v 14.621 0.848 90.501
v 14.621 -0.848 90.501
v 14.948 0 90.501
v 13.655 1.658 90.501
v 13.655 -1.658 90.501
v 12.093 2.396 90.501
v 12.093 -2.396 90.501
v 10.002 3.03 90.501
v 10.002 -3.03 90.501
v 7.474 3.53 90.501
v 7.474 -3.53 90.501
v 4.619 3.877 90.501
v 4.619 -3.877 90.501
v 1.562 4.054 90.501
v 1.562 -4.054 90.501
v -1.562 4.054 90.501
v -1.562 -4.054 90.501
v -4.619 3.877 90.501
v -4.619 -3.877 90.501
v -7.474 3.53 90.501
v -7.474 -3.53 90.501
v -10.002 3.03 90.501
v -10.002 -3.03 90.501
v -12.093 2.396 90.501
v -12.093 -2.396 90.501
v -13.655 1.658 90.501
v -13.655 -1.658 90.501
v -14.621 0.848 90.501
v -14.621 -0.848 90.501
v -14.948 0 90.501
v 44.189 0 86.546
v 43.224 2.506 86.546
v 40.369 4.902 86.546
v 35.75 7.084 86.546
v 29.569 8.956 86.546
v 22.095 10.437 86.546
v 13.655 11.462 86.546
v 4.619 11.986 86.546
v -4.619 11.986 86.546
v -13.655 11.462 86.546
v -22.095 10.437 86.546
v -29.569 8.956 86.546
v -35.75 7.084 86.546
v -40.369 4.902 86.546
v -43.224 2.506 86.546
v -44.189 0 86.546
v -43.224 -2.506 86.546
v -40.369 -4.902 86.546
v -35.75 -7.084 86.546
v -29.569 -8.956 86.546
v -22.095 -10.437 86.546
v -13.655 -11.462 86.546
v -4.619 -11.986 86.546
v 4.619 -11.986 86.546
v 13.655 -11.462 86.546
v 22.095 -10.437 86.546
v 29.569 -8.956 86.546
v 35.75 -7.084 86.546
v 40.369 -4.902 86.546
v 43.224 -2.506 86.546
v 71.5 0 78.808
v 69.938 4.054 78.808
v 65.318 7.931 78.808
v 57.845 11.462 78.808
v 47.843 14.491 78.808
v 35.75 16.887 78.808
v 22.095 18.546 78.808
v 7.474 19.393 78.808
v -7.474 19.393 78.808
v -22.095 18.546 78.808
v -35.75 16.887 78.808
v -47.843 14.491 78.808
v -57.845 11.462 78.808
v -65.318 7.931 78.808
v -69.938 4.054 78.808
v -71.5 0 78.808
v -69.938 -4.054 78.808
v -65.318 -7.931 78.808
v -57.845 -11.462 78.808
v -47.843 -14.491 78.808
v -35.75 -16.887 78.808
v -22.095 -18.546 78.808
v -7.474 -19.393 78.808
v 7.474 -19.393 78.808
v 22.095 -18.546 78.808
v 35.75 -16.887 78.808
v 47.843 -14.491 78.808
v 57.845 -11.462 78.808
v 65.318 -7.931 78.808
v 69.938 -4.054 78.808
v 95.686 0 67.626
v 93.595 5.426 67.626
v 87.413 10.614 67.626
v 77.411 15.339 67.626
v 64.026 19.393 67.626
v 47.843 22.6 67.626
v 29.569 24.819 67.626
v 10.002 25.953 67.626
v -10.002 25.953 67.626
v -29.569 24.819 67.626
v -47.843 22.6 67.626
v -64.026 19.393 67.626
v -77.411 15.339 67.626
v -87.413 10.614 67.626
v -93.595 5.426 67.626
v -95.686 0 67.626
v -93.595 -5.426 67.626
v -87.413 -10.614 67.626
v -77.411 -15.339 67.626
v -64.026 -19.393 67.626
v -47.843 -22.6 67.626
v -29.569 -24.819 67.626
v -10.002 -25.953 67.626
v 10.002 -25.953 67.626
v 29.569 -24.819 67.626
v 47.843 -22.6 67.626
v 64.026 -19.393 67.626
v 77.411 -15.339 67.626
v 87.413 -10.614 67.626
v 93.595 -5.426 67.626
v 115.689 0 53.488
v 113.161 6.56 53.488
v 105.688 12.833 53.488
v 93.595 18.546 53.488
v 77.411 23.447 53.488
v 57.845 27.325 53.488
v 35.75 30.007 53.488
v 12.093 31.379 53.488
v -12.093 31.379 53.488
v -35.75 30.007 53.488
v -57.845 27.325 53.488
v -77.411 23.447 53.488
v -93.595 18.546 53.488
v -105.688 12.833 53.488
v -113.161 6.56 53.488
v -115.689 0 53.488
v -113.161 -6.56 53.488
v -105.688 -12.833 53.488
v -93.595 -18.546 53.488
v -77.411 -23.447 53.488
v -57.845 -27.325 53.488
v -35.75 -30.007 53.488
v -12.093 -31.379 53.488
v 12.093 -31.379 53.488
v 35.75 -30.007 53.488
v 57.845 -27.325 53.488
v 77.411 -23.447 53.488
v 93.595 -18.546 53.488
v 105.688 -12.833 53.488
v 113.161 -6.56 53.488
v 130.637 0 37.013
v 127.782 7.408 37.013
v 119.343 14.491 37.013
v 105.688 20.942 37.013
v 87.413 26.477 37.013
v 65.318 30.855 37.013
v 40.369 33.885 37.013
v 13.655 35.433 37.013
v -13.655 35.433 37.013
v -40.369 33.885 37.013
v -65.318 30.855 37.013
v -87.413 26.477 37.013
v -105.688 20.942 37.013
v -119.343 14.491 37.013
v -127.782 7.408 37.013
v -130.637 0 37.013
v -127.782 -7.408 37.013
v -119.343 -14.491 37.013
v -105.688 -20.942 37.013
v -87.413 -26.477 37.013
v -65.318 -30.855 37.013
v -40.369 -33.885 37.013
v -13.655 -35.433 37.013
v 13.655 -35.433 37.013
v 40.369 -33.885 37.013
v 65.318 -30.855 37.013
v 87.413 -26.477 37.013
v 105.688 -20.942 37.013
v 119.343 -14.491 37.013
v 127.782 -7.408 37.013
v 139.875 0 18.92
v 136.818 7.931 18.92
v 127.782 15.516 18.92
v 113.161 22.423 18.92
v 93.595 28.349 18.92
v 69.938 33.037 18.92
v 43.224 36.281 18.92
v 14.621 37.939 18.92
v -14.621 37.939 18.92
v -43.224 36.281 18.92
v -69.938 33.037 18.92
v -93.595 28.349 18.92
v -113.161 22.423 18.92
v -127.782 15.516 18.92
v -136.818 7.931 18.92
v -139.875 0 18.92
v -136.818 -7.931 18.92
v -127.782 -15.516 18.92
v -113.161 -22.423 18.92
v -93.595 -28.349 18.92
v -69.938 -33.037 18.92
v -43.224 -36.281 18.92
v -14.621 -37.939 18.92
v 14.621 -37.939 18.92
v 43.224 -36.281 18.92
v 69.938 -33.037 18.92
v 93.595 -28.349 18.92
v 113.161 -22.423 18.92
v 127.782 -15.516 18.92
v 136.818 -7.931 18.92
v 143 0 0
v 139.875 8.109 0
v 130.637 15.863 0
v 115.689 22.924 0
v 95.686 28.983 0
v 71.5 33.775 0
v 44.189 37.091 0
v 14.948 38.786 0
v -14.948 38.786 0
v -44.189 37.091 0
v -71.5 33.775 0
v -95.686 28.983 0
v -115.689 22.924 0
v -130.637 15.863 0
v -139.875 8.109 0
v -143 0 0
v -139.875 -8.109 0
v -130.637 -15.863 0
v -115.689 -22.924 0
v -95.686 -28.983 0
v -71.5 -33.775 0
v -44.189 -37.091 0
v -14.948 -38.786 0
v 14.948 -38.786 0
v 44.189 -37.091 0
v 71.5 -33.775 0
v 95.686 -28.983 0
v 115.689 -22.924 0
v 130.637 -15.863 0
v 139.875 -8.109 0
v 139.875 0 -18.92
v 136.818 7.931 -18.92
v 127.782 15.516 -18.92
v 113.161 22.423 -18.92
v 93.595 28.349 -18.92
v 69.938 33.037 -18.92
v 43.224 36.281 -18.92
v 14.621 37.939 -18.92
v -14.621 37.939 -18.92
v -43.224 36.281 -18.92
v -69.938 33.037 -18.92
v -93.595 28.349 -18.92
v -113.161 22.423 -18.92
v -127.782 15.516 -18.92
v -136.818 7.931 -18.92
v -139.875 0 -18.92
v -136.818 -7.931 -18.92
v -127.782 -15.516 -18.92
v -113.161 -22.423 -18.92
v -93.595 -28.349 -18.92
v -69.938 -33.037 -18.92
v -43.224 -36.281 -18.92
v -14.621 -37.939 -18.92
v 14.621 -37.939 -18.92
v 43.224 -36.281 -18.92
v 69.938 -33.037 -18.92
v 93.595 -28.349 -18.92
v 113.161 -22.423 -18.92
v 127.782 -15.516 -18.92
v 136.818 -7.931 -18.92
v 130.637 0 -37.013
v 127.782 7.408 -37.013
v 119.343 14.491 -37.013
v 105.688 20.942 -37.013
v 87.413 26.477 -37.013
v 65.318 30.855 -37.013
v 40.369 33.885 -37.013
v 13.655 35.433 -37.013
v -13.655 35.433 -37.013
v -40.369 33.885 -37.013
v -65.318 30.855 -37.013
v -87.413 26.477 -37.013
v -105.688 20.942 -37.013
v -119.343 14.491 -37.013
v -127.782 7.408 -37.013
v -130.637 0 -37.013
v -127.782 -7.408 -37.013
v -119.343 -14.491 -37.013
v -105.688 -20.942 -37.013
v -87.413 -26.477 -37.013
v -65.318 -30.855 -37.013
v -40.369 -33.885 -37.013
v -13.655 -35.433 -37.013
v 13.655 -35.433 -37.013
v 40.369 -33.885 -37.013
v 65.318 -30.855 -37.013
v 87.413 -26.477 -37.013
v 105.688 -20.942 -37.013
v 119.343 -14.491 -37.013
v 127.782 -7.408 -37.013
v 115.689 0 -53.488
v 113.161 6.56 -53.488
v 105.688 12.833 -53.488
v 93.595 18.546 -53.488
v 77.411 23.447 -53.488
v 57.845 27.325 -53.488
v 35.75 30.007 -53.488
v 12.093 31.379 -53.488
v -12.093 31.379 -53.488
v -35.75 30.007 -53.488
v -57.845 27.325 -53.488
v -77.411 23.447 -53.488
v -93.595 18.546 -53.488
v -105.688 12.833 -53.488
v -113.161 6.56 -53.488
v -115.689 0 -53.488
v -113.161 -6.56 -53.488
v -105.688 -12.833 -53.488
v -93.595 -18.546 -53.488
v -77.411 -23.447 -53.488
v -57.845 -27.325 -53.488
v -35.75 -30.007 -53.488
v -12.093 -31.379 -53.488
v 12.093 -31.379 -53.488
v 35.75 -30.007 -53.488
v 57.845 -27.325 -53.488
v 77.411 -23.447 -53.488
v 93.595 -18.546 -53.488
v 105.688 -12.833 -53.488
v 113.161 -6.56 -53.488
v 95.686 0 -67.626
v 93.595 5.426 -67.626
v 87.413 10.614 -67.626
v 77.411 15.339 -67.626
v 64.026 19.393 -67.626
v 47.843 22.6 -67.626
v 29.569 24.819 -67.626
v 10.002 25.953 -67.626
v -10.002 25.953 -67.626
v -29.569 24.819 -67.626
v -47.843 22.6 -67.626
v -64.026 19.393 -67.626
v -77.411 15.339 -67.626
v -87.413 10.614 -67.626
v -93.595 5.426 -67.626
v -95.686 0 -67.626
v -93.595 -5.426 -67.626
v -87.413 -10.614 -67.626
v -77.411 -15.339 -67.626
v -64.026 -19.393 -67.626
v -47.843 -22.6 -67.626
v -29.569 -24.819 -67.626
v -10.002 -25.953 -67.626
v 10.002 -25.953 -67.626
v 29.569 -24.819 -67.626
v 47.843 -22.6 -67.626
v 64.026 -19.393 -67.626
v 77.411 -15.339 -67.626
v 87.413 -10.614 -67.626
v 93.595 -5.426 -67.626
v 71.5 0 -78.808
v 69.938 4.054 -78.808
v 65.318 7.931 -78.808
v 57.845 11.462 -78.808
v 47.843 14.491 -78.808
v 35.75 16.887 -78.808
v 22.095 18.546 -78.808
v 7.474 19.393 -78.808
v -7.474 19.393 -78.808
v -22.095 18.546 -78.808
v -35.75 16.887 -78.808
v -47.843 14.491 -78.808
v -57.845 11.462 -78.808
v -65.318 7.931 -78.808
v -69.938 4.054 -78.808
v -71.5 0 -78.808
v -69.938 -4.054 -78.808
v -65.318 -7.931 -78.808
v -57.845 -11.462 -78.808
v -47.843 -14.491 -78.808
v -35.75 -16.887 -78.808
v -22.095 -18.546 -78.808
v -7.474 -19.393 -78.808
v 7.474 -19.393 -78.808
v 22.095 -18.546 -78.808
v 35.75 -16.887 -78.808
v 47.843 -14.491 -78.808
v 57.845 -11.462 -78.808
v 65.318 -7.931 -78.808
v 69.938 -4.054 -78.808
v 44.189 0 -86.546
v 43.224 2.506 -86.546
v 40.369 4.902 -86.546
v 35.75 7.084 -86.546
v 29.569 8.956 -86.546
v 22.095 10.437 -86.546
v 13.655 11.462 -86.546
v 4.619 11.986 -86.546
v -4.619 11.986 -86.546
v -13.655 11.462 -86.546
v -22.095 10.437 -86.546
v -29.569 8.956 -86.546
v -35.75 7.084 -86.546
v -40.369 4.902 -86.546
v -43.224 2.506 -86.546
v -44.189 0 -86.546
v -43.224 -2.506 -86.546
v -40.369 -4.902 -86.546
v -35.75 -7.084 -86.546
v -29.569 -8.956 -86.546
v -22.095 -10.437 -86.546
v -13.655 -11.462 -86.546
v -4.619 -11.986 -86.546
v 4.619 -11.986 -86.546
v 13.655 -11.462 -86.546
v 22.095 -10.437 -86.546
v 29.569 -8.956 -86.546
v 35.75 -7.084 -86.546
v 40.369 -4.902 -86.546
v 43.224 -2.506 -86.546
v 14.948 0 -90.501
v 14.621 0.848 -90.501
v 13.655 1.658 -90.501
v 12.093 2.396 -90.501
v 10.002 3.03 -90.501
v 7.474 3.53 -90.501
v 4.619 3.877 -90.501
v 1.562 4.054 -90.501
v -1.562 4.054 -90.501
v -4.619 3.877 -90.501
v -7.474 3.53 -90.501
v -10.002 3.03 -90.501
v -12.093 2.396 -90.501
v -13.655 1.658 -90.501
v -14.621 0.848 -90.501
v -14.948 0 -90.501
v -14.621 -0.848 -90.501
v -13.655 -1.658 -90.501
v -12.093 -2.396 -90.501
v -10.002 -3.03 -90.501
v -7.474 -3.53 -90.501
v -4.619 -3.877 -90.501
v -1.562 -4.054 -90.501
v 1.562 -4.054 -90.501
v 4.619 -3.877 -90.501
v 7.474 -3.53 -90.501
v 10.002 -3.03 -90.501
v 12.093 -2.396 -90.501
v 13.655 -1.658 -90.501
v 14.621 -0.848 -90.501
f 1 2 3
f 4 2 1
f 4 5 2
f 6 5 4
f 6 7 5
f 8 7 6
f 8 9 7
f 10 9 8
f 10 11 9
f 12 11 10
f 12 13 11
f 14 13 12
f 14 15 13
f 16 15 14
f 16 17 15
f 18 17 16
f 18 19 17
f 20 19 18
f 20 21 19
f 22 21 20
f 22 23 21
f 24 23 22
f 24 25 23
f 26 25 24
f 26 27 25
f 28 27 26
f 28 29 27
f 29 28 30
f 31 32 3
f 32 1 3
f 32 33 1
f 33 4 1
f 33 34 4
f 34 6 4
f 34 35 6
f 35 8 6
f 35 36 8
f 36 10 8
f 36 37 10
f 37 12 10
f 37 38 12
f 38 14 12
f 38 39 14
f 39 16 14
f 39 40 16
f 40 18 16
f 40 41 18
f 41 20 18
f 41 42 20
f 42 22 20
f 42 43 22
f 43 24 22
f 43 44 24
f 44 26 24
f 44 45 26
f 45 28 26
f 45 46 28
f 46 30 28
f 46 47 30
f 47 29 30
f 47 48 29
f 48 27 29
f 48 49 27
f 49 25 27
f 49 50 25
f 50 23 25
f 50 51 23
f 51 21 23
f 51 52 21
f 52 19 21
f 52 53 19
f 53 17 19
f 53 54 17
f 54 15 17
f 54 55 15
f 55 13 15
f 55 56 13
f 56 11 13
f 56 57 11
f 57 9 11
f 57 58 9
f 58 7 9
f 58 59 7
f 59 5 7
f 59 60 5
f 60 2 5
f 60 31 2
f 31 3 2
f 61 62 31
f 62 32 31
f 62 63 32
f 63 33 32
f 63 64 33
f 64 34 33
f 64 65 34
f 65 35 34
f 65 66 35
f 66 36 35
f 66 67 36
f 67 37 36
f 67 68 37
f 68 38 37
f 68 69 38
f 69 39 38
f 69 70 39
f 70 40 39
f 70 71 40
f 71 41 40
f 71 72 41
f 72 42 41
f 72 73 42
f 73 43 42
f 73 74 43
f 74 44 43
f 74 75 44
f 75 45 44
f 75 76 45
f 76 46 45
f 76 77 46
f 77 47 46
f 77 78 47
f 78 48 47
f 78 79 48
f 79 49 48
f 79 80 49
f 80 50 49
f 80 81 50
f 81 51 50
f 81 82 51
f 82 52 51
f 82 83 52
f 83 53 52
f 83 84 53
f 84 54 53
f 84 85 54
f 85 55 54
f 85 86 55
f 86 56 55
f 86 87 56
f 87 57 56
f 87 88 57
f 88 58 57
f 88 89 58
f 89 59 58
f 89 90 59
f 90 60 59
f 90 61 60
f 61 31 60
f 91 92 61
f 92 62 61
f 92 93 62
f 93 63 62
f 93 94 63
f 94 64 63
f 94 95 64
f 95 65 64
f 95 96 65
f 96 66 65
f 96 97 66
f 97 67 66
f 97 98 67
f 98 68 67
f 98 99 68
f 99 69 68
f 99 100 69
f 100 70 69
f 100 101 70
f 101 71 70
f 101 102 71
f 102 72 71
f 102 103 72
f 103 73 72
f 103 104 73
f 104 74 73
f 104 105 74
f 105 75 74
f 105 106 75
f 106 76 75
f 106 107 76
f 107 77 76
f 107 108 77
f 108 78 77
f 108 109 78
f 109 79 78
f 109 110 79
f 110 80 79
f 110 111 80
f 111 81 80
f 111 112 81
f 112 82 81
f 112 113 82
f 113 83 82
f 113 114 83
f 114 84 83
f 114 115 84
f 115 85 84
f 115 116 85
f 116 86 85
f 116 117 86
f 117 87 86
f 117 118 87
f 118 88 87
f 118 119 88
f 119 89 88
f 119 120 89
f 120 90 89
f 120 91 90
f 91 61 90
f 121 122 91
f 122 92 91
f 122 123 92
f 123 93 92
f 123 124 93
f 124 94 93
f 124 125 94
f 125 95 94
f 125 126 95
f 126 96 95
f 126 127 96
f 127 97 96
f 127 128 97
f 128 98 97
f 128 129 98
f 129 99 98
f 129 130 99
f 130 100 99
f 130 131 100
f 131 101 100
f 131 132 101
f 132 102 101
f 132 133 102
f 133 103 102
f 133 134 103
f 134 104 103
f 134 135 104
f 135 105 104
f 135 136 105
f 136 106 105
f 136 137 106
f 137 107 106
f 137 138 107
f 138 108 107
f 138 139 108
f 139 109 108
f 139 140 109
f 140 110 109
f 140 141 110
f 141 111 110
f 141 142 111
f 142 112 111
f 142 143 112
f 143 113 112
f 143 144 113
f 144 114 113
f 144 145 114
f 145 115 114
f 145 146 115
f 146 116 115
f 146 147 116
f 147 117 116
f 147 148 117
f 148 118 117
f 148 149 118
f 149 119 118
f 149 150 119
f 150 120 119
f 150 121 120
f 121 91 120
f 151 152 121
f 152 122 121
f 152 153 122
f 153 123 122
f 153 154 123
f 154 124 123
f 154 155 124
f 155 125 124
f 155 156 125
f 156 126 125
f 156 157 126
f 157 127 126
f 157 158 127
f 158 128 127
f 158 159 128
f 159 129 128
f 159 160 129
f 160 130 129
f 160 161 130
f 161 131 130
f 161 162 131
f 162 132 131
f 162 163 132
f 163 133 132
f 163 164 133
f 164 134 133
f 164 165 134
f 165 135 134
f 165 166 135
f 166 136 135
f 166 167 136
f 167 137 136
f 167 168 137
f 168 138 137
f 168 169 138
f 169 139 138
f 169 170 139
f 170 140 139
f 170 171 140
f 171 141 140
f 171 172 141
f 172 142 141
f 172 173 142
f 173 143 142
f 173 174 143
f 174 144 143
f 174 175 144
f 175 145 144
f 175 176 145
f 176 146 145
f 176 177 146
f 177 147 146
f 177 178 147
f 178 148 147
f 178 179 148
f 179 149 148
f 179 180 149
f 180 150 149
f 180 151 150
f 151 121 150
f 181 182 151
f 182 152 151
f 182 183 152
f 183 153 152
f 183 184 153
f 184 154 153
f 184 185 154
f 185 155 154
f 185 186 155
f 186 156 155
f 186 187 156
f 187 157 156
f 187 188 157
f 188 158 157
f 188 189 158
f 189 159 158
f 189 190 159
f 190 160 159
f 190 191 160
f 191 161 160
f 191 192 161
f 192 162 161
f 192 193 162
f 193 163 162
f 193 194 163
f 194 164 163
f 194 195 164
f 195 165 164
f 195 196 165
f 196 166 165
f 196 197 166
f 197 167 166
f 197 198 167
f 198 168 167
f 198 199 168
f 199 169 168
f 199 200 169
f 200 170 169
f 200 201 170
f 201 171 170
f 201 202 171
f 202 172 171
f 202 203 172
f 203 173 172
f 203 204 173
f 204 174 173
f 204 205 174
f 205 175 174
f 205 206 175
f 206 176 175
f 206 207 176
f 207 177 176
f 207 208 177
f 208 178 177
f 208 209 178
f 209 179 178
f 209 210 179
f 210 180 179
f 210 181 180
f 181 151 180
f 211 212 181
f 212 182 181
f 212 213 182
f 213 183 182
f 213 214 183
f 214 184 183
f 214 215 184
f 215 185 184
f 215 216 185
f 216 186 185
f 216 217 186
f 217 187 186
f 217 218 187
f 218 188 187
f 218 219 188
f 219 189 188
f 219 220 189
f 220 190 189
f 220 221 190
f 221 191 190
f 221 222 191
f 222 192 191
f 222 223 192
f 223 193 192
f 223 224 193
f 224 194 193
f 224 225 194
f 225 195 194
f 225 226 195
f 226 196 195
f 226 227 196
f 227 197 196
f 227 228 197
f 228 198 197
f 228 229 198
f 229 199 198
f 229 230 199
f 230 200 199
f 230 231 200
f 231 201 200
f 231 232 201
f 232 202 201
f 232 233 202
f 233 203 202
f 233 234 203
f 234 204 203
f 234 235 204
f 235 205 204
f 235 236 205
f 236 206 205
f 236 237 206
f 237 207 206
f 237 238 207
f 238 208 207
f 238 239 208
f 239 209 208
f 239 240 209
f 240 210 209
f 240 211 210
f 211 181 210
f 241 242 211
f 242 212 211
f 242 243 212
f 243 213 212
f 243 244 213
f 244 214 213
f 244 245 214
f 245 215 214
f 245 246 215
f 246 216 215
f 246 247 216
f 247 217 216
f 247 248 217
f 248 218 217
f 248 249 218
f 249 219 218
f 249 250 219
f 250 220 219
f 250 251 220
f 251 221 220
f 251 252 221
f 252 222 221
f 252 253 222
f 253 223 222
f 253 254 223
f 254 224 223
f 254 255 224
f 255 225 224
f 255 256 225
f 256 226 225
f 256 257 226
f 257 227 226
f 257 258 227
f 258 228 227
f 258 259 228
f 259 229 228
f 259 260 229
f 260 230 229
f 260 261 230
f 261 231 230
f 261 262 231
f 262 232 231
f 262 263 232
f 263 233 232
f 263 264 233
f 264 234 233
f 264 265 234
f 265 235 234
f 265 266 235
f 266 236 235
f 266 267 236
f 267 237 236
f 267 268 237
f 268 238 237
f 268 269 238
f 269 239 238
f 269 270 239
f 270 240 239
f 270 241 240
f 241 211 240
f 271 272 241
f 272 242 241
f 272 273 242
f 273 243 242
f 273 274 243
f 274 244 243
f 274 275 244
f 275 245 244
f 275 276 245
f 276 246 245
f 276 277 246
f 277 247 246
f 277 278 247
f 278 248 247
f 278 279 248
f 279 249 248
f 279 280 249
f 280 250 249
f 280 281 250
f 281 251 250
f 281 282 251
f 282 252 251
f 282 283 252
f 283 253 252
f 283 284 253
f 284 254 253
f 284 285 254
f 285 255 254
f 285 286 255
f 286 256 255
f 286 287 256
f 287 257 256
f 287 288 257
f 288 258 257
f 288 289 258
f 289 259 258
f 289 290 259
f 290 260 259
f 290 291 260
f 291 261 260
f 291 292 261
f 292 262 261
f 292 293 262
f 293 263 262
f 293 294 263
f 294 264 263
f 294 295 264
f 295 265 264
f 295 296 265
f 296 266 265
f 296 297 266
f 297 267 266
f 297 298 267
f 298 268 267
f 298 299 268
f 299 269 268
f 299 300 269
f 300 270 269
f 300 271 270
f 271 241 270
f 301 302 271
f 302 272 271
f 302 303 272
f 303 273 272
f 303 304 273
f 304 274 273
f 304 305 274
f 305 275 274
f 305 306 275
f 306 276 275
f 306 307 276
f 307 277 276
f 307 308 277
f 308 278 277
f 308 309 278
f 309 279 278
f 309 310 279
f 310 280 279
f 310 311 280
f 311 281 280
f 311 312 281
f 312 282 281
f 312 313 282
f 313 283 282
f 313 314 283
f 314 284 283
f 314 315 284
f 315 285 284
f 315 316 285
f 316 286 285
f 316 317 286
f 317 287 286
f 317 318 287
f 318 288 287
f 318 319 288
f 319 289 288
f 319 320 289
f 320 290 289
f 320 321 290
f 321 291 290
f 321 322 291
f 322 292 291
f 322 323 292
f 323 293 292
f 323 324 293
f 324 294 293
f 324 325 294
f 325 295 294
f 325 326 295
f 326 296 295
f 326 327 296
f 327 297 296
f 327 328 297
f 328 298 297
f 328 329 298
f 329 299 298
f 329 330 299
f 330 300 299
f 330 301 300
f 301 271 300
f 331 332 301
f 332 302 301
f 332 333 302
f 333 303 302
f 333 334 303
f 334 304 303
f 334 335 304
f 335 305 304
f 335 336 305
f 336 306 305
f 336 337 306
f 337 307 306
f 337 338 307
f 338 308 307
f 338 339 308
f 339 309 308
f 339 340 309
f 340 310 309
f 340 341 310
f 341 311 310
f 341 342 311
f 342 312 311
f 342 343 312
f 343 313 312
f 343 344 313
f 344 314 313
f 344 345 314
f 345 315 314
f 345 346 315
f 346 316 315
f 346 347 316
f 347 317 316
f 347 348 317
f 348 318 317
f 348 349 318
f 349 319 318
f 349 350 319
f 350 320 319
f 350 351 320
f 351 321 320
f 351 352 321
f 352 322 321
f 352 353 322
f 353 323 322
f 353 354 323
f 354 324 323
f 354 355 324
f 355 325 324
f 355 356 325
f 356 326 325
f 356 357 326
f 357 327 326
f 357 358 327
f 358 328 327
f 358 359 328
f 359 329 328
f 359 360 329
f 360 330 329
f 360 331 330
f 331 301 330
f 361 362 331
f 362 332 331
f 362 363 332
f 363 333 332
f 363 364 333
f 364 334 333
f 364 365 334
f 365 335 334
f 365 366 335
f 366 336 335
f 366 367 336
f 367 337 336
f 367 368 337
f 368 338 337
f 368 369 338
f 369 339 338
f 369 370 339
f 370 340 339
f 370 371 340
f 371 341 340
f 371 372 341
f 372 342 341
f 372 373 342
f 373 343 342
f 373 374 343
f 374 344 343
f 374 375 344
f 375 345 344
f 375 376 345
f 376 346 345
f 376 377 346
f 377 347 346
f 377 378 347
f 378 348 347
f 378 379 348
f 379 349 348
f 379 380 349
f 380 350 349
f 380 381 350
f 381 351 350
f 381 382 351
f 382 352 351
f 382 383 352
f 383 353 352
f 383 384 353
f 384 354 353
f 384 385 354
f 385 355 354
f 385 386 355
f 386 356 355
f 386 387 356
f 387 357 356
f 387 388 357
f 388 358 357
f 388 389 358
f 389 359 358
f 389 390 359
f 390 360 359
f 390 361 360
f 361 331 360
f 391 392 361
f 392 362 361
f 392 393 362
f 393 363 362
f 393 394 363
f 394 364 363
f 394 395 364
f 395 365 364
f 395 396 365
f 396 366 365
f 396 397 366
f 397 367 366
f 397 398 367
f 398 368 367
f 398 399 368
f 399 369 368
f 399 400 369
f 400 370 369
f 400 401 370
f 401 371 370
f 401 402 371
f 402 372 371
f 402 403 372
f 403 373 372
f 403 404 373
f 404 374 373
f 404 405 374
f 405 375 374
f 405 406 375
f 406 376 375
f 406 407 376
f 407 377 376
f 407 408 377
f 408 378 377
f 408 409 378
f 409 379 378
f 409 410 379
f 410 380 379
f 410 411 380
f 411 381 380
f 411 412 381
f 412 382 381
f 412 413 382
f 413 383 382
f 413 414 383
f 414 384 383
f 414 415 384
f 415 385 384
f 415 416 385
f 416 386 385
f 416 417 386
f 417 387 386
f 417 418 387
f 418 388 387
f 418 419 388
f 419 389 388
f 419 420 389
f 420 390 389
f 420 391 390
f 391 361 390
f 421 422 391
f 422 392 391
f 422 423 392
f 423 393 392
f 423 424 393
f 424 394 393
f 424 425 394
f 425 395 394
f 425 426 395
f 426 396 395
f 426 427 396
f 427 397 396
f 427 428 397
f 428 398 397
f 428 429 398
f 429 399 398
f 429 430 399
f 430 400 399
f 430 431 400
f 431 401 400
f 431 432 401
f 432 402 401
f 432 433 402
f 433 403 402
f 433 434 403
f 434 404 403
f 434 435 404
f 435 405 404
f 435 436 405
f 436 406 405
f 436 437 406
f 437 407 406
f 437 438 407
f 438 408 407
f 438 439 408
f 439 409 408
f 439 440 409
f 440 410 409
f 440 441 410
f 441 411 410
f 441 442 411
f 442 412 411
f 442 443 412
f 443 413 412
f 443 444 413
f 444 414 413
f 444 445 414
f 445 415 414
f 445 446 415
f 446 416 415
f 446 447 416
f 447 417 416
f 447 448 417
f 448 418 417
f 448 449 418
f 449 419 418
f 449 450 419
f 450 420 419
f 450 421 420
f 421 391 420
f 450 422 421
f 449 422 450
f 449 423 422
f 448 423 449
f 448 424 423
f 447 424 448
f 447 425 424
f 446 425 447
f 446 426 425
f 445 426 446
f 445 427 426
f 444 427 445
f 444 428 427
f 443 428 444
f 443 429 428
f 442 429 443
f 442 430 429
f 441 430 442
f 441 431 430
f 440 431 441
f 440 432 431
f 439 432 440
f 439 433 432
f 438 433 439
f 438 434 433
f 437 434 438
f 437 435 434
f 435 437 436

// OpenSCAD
// Generated by SolidPython 1.0.1 on 2020-07-29 00:46:49


scale(v = [11, 3, 7]) {
	sphere(r = 13);
}
/***********************************************
*********      SolidPython code:      **********
************************************************
 
# import packages: SolidPython
from solid import *
from solid.utils import *
from itertools import chain, combinations, permutations


class Resize:

    def __init__(self, scad_file):
        self.scad_file = scad_file
        #self.scad_file = import_scad(scad_file)
        # cone/cylinder param:
        self.r1 = 0
        self.r2 = 0
        self.h = 0
        # rectangular prism param:
        self.w = 0
        self.l = 0
        # ellipse param:
        self.r = 0

    # import OpenScad code (file name corresponds to shape)


    # classify shape + parameters
    def assign(self, param1, param2, param3):
        if self.scad_file == 'cone.scad':
            self.r1 = param1
            self.r2 = param2
            self.h = param3
        elif self.scad_file == 'cylinder.scad':
            self.r1 = param1
            self.r2 = param2
            self.h = param3
        elif self.scad_file == 'rectangularPrism.scad':
            self.h = param1
            self.l = param2
            self.w = param3
        else:
            self.r = param1
            self.h = param2

    # resize parameters
    def iterate(self):
        x = range(3, 20, 2)
        i = 1
        if self.scad_file == 'cone.scad':
            tempList = list(permutations(x, 2))
            for temp in tempList:
                param1 = temp[0]
                param2 = temp[1]
                filepath = 'produced_scad_files/' + 'cone' + str(param1) + '_' + str(param2) + '_' + '.scad'
                scad_render_to_file(cylinder(h=param1, r1=param2, r2=0), filepath)

        elif self.scad_file == 'cylinder.scad':
            tempList = list(permutations(x, 3))
            for temp in tempList:
                param1 = temp[0]
                param2 = temp[1]
                filepath = 'produced_scad_files/' + 'cylinder' + str(param1) + '_' + str(param2) + '_' + '.scad'
                scad_render_to_file(cylinder(h=param1, r1=param2, r2=param2), filepath)

        elif self.scad_file == 'rectangularPrism.scad':
            tempList = list(permutations(x, 3))
            for temp in tempList:
                param1 = temp[0]
                param2 = temp[1]
                param3 = temp[2]
                filepath = 'produced_scad_files/' + 'rectangularPrism' + str(param1) + '_' + str(param2) + '_' + str(
                    param3) + '.scad'
                scad_render_to_file(cube(size=(param1, param2, param3)), filepath)

        elif self.scad_file == 'ellipse.scad':
            tempList = list(permutations(x, 4))
            for temp in tempList:
                param1 = temp[0]
                param2 = temp[1]
                param3 = temp[2]
                param4 = temp[3]
                filepath = 'produced_scad_files/' + 'ellipse' + str(param1) + '_' + str(param2) + '_' + str(param3) + '_' + str(param4) + '.scad'
                scad_render_to_file(scale([param1, param2, param3])(sphere(r=param4)), filepath)

    def render_to_scadfile(self):
        scad_render_to_file(scad, 'example.scad') 
 
************************************************/
